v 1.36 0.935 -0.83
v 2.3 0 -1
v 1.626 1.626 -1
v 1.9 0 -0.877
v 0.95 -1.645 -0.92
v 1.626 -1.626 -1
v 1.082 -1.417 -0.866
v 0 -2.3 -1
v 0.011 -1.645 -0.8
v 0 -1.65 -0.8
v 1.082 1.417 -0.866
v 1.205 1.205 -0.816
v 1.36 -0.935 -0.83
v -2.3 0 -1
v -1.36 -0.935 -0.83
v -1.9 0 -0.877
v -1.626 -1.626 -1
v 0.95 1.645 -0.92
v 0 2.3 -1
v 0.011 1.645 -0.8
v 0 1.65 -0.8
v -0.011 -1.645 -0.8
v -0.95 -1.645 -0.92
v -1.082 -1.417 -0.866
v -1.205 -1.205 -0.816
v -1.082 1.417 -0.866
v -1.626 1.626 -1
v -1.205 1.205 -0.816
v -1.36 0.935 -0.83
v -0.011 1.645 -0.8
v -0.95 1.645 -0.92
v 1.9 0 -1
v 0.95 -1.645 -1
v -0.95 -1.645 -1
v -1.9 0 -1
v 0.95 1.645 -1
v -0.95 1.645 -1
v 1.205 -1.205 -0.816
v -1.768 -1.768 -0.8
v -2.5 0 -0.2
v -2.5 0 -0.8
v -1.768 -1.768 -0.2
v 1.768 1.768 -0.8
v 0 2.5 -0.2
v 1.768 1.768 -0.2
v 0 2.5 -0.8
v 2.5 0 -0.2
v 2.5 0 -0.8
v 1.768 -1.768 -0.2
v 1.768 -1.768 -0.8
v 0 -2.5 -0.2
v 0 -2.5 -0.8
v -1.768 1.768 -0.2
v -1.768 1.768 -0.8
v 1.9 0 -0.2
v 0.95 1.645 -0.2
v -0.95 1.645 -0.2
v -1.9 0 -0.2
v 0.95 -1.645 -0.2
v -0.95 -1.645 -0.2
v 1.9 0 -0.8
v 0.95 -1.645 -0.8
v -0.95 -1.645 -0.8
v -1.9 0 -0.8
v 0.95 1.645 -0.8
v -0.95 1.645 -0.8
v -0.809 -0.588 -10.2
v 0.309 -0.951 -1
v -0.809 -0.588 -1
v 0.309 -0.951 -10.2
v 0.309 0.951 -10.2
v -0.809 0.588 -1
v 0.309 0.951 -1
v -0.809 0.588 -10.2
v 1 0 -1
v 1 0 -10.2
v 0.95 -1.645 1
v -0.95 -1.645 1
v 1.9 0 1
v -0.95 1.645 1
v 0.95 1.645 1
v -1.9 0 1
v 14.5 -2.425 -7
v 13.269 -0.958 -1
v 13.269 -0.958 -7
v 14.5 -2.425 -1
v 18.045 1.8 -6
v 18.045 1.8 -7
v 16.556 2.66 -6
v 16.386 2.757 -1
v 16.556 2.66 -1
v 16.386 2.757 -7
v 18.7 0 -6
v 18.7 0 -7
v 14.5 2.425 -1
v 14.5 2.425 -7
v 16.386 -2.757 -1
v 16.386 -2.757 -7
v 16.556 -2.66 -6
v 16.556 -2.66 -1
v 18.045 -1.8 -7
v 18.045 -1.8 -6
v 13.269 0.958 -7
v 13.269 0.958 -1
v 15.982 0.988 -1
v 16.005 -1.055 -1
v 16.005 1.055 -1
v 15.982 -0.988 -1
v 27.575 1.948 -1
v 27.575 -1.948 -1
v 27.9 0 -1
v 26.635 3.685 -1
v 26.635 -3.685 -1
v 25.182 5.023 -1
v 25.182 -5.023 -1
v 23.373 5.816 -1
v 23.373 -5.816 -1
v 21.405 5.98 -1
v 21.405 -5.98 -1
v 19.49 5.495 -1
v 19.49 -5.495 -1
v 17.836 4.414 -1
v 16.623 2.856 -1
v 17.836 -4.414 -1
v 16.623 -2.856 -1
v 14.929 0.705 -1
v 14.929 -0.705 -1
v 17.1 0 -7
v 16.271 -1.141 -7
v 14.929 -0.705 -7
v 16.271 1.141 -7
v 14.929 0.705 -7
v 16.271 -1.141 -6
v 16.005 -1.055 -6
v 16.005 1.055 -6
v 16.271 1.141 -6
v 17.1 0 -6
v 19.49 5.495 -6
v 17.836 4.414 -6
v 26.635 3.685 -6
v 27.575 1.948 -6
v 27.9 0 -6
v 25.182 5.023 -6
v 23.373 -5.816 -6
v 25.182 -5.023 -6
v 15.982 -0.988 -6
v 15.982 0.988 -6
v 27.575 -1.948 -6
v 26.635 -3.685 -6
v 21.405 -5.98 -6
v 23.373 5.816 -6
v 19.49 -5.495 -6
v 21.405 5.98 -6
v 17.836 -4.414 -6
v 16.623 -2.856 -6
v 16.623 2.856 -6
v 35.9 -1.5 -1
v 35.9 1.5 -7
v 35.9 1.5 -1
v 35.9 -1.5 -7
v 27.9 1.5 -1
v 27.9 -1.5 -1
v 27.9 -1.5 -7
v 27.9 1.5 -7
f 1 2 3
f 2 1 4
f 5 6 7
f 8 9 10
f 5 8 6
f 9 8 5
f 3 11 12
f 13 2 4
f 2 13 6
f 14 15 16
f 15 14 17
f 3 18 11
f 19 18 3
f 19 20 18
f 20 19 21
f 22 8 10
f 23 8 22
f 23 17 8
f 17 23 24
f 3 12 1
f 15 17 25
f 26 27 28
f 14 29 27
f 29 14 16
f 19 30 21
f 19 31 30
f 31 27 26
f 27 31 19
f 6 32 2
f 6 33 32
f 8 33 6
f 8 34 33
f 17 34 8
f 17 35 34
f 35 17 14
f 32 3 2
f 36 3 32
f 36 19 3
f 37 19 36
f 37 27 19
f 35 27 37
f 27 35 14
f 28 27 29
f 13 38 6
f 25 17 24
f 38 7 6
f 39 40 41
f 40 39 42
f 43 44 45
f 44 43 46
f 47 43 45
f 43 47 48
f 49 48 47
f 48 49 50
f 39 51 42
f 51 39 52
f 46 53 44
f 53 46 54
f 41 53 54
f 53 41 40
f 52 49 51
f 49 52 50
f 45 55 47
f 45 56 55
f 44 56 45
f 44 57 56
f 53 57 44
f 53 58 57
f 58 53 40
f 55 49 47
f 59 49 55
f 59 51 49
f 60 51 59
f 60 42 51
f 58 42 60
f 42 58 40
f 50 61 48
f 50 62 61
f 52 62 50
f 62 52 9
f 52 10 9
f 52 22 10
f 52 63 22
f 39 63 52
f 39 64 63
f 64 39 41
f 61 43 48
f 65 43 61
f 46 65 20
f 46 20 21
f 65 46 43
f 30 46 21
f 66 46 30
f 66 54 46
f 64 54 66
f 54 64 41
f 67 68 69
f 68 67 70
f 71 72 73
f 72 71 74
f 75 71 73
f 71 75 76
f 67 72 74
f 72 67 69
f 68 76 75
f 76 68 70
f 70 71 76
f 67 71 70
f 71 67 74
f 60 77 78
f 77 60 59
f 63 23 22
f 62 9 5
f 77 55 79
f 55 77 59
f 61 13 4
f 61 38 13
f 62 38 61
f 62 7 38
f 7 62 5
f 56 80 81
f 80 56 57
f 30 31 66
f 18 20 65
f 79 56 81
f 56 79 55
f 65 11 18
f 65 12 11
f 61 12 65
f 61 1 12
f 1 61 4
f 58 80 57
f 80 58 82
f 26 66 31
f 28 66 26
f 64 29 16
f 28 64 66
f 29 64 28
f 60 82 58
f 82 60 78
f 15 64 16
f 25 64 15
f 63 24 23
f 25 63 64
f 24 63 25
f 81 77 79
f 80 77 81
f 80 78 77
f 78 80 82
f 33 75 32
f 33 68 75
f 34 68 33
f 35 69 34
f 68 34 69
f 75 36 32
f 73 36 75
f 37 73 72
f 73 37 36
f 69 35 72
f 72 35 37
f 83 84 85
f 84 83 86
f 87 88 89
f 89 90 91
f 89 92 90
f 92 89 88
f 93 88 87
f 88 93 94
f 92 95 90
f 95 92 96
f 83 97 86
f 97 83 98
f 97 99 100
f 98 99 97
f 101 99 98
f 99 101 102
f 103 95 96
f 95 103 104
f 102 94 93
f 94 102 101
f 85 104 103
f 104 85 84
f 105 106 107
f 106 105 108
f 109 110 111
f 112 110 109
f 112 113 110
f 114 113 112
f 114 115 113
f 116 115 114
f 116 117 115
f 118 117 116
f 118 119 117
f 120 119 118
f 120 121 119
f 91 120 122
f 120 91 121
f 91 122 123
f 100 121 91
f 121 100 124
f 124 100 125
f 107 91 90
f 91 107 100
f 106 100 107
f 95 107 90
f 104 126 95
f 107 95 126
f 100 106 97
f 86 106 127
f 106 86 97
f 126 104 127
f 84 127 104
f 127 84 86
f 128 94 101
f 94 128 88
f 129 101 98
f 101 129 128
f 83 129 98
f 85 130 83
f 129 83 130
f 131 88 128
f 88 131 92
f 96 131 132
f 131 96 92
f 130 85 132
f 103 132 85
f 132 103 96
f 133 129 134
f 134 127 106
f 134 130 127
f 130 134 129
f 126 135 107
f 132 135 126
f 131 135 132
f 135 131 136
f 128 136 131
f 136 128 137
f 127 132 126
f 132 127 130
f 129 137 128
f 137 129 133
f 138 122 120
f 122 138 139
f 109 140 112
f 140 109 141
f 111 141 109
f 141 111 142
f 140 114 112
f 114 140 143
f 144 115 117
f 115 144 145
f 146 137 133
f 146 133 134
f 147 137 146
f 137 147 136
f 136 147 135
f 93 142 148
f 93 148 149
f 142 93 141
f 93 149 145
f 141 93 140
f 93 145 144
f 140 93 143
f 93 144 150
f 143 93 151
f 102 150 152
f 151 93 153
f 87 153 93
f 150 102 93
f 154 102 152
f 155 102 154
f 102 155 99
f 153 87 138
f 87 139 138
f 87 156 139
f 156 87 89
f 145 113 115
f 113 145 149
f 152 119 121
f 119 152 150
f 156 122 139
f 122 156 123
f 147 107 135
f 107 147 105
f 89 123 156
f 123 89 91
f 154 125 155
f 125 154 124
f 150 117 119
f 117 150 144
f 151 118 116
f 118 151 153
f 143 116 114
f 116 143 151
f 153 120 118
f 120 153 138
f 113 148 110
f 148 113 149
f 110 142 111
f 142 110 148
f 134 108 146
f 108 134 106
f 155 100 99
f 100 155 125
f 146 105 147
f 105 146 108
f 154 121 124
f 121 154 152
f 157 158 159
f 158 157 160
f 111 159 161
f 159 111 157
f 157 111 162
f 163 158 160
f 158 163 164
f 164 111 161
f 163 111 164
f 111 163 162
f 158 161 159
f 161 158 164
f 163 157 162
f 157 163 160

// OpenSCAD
// Parameters
shaft_diameter_mm = 2.0; //[1.0:4.0:0.1]
length_under_head_mm = 10.0; //[5.0:20.0:0.5]
head_diameter_mm = 3.8; //[2.0:7.6:0.1]
head_height_mm = 2.0; //[1.0:4.0:0.1]
socket_across_flats_mm = 1.5; //[1.0:3.0:0.05]
socket_depth_mm = 1.2; //[0.6:1.8:0.05]
threaded = 1; //[0:1:1]
thread_pitch_mm = 0.4; //[0.2:0.8:0.05]
thread_length_mm = 10.0; //[5.0:20.0:0.5]
underhead_chamfer_height_mm = 0.4; //[0.2:1.0:0.05]
underhead_chamfer_radial_mm = 0.4; //[0.2:1.0:0.05]
overlap_mm = 0.8; //[0.5:2.0:0.1]
thread_representation_ridge_depth_mm = 0.15; //[0.05:0.3:0.01]
thread_representation_ridge_width_mm = 0.25; //[0.1:0.6:0.01]
thread_representation_ridge_count = 12; //[0:36:1]
washer_outer_diameter_mm = 5.0; //[3.0:10.0:0.1]
washer_thickness_mm = 0.6; //[0.3:1.5:0.05]
pcb_spacer_height_mm = 6.0; //[3.0:15.0:0.5]
pcb_spacer_wall_mm = 1.8; //[0.8:3.6:0.1]
sprue_diameter_mm = 1.2; //[0.8:3.0:0.1]
sprue_length_mm = 12.0; //[6.0:30.0:1]
buzzer_diameter_mm = 12.0; //[6.0:24.0:0.5]
buzzer_height_mm = 5.0; //[2.5:12.0:0.5]
pin_socket_width_mm = 8.0; //[4.0:16.0:0.5]
pin_socket_depth_mm = 3.0; //[1.5:8.0:0.5]
pin_socket_height_mm = 6.0; //[3.0:15.0:0.5]

// Screw and Washer
module screw_and_washer() {
  color("DimGray") {
    // Threaded Shaft
    translate([0, 0, -head_height_mm/2 - length_under_head_mm/2 + overlap_mm])
      cylinder(h=length_under_head_mm, r=shaft_diameter_mm/2, center=true);

    // Cap Head
    translate([0, 0, 0])
      cylinder(h=head_height_mm, r=head_diameter_mm/2, center=true);

    // Underhead Chamfer
    translate([0, 0, -head_height_mm/2 + underhead_chamfer_height_mm/2])
      difference() {
        cylinder(h=underhead_chamfer_height_mm, r1=head_diameter_mm/2 + underhead_chamfer_radial_mm, r2=shaft_diameter_mm/2, center=true);
        cylinder(h=underhead_chamfer_height_mm, r=shaft_diameter_mm/2, center=true);
      }

    // Hex Socket Recess
    translate([0, 0, head_height_mm/2 - socket_depth_mm/2])
      cylinder(h=socket_depth_mm, r=socket_across_flats_mm/(2*cos(30)), center=true);

    // Washer
    translate([0, 0, -head_height_mm/2 - washer_thickness_mm/2 + overlap_mm])
      difference() {
        cylinder(h=washer_thickness_mm, r=washer_outer_diameter_mm/2, center=true);
        cylinder(h=washer_thickness_mm + overlap_mm*2, r=shaft_diameter_mm/2 + overlap_mm/4, center=true);
      }
  }
}

// PCB Spacer
module pcb_spacer() {
  color("Silver") {
    translate([head_diameter_mm/2 + sprue_length_mm + (shaft_diameter_mm/2 + pcb_spacer_wall_mm) - overlap_mm, 0, -head_height_mm/2 - pcb_spacer_height_mm/2])
      difference() {
        cylinder(h=pcb_spacer_height_mm, r=shaft_diameter_mm/2 + pcb_spacer_wall_mm, center=true);
        cylinder(h=pcb_spacer_height_mm + overlap_mm*2, r=shaft_diameter_mm/2 + overlap_mm/4, center=true);
      }
  }
}

// Buzzer
module buzzer() {
  color("Black") {
    translate([head_diameter_mm/2 + sprue_length_mm + (shaft_diameter_mm/2 + pcb_spacer_wall_mm) + (buzzer_diameter_mm/2) - overlap_mm, 0, -head_height_mm/2 - buzzer_height_mm/2])
      cylinder(h=buzzer_height_mm, r=buzzer_diameter_mm/2, center=true);
  }
}

// Pin Socket
module pin_socket() {
  color("Blue") {
    translate([head_diameter_mm/2 + sprue_length_mm + (shaft_diameter_mm/2 + pcb_spacer_wall_mm) + buzzer_diameter_mm + pin_socket_width_mm/2 - overlap_mm, 0, -head_height_mm/2 - pin_socket_height_mm/2])
      cube([pin_socket_width_mm, pin_socket_depth_mm, pin_socket_height_mm], center=true);
  }
}

// Assembly
module assembly() {
  screw_and_washer();
  pcb_spacer();
  buzzer();
  pin_socket();
}

assembly();
